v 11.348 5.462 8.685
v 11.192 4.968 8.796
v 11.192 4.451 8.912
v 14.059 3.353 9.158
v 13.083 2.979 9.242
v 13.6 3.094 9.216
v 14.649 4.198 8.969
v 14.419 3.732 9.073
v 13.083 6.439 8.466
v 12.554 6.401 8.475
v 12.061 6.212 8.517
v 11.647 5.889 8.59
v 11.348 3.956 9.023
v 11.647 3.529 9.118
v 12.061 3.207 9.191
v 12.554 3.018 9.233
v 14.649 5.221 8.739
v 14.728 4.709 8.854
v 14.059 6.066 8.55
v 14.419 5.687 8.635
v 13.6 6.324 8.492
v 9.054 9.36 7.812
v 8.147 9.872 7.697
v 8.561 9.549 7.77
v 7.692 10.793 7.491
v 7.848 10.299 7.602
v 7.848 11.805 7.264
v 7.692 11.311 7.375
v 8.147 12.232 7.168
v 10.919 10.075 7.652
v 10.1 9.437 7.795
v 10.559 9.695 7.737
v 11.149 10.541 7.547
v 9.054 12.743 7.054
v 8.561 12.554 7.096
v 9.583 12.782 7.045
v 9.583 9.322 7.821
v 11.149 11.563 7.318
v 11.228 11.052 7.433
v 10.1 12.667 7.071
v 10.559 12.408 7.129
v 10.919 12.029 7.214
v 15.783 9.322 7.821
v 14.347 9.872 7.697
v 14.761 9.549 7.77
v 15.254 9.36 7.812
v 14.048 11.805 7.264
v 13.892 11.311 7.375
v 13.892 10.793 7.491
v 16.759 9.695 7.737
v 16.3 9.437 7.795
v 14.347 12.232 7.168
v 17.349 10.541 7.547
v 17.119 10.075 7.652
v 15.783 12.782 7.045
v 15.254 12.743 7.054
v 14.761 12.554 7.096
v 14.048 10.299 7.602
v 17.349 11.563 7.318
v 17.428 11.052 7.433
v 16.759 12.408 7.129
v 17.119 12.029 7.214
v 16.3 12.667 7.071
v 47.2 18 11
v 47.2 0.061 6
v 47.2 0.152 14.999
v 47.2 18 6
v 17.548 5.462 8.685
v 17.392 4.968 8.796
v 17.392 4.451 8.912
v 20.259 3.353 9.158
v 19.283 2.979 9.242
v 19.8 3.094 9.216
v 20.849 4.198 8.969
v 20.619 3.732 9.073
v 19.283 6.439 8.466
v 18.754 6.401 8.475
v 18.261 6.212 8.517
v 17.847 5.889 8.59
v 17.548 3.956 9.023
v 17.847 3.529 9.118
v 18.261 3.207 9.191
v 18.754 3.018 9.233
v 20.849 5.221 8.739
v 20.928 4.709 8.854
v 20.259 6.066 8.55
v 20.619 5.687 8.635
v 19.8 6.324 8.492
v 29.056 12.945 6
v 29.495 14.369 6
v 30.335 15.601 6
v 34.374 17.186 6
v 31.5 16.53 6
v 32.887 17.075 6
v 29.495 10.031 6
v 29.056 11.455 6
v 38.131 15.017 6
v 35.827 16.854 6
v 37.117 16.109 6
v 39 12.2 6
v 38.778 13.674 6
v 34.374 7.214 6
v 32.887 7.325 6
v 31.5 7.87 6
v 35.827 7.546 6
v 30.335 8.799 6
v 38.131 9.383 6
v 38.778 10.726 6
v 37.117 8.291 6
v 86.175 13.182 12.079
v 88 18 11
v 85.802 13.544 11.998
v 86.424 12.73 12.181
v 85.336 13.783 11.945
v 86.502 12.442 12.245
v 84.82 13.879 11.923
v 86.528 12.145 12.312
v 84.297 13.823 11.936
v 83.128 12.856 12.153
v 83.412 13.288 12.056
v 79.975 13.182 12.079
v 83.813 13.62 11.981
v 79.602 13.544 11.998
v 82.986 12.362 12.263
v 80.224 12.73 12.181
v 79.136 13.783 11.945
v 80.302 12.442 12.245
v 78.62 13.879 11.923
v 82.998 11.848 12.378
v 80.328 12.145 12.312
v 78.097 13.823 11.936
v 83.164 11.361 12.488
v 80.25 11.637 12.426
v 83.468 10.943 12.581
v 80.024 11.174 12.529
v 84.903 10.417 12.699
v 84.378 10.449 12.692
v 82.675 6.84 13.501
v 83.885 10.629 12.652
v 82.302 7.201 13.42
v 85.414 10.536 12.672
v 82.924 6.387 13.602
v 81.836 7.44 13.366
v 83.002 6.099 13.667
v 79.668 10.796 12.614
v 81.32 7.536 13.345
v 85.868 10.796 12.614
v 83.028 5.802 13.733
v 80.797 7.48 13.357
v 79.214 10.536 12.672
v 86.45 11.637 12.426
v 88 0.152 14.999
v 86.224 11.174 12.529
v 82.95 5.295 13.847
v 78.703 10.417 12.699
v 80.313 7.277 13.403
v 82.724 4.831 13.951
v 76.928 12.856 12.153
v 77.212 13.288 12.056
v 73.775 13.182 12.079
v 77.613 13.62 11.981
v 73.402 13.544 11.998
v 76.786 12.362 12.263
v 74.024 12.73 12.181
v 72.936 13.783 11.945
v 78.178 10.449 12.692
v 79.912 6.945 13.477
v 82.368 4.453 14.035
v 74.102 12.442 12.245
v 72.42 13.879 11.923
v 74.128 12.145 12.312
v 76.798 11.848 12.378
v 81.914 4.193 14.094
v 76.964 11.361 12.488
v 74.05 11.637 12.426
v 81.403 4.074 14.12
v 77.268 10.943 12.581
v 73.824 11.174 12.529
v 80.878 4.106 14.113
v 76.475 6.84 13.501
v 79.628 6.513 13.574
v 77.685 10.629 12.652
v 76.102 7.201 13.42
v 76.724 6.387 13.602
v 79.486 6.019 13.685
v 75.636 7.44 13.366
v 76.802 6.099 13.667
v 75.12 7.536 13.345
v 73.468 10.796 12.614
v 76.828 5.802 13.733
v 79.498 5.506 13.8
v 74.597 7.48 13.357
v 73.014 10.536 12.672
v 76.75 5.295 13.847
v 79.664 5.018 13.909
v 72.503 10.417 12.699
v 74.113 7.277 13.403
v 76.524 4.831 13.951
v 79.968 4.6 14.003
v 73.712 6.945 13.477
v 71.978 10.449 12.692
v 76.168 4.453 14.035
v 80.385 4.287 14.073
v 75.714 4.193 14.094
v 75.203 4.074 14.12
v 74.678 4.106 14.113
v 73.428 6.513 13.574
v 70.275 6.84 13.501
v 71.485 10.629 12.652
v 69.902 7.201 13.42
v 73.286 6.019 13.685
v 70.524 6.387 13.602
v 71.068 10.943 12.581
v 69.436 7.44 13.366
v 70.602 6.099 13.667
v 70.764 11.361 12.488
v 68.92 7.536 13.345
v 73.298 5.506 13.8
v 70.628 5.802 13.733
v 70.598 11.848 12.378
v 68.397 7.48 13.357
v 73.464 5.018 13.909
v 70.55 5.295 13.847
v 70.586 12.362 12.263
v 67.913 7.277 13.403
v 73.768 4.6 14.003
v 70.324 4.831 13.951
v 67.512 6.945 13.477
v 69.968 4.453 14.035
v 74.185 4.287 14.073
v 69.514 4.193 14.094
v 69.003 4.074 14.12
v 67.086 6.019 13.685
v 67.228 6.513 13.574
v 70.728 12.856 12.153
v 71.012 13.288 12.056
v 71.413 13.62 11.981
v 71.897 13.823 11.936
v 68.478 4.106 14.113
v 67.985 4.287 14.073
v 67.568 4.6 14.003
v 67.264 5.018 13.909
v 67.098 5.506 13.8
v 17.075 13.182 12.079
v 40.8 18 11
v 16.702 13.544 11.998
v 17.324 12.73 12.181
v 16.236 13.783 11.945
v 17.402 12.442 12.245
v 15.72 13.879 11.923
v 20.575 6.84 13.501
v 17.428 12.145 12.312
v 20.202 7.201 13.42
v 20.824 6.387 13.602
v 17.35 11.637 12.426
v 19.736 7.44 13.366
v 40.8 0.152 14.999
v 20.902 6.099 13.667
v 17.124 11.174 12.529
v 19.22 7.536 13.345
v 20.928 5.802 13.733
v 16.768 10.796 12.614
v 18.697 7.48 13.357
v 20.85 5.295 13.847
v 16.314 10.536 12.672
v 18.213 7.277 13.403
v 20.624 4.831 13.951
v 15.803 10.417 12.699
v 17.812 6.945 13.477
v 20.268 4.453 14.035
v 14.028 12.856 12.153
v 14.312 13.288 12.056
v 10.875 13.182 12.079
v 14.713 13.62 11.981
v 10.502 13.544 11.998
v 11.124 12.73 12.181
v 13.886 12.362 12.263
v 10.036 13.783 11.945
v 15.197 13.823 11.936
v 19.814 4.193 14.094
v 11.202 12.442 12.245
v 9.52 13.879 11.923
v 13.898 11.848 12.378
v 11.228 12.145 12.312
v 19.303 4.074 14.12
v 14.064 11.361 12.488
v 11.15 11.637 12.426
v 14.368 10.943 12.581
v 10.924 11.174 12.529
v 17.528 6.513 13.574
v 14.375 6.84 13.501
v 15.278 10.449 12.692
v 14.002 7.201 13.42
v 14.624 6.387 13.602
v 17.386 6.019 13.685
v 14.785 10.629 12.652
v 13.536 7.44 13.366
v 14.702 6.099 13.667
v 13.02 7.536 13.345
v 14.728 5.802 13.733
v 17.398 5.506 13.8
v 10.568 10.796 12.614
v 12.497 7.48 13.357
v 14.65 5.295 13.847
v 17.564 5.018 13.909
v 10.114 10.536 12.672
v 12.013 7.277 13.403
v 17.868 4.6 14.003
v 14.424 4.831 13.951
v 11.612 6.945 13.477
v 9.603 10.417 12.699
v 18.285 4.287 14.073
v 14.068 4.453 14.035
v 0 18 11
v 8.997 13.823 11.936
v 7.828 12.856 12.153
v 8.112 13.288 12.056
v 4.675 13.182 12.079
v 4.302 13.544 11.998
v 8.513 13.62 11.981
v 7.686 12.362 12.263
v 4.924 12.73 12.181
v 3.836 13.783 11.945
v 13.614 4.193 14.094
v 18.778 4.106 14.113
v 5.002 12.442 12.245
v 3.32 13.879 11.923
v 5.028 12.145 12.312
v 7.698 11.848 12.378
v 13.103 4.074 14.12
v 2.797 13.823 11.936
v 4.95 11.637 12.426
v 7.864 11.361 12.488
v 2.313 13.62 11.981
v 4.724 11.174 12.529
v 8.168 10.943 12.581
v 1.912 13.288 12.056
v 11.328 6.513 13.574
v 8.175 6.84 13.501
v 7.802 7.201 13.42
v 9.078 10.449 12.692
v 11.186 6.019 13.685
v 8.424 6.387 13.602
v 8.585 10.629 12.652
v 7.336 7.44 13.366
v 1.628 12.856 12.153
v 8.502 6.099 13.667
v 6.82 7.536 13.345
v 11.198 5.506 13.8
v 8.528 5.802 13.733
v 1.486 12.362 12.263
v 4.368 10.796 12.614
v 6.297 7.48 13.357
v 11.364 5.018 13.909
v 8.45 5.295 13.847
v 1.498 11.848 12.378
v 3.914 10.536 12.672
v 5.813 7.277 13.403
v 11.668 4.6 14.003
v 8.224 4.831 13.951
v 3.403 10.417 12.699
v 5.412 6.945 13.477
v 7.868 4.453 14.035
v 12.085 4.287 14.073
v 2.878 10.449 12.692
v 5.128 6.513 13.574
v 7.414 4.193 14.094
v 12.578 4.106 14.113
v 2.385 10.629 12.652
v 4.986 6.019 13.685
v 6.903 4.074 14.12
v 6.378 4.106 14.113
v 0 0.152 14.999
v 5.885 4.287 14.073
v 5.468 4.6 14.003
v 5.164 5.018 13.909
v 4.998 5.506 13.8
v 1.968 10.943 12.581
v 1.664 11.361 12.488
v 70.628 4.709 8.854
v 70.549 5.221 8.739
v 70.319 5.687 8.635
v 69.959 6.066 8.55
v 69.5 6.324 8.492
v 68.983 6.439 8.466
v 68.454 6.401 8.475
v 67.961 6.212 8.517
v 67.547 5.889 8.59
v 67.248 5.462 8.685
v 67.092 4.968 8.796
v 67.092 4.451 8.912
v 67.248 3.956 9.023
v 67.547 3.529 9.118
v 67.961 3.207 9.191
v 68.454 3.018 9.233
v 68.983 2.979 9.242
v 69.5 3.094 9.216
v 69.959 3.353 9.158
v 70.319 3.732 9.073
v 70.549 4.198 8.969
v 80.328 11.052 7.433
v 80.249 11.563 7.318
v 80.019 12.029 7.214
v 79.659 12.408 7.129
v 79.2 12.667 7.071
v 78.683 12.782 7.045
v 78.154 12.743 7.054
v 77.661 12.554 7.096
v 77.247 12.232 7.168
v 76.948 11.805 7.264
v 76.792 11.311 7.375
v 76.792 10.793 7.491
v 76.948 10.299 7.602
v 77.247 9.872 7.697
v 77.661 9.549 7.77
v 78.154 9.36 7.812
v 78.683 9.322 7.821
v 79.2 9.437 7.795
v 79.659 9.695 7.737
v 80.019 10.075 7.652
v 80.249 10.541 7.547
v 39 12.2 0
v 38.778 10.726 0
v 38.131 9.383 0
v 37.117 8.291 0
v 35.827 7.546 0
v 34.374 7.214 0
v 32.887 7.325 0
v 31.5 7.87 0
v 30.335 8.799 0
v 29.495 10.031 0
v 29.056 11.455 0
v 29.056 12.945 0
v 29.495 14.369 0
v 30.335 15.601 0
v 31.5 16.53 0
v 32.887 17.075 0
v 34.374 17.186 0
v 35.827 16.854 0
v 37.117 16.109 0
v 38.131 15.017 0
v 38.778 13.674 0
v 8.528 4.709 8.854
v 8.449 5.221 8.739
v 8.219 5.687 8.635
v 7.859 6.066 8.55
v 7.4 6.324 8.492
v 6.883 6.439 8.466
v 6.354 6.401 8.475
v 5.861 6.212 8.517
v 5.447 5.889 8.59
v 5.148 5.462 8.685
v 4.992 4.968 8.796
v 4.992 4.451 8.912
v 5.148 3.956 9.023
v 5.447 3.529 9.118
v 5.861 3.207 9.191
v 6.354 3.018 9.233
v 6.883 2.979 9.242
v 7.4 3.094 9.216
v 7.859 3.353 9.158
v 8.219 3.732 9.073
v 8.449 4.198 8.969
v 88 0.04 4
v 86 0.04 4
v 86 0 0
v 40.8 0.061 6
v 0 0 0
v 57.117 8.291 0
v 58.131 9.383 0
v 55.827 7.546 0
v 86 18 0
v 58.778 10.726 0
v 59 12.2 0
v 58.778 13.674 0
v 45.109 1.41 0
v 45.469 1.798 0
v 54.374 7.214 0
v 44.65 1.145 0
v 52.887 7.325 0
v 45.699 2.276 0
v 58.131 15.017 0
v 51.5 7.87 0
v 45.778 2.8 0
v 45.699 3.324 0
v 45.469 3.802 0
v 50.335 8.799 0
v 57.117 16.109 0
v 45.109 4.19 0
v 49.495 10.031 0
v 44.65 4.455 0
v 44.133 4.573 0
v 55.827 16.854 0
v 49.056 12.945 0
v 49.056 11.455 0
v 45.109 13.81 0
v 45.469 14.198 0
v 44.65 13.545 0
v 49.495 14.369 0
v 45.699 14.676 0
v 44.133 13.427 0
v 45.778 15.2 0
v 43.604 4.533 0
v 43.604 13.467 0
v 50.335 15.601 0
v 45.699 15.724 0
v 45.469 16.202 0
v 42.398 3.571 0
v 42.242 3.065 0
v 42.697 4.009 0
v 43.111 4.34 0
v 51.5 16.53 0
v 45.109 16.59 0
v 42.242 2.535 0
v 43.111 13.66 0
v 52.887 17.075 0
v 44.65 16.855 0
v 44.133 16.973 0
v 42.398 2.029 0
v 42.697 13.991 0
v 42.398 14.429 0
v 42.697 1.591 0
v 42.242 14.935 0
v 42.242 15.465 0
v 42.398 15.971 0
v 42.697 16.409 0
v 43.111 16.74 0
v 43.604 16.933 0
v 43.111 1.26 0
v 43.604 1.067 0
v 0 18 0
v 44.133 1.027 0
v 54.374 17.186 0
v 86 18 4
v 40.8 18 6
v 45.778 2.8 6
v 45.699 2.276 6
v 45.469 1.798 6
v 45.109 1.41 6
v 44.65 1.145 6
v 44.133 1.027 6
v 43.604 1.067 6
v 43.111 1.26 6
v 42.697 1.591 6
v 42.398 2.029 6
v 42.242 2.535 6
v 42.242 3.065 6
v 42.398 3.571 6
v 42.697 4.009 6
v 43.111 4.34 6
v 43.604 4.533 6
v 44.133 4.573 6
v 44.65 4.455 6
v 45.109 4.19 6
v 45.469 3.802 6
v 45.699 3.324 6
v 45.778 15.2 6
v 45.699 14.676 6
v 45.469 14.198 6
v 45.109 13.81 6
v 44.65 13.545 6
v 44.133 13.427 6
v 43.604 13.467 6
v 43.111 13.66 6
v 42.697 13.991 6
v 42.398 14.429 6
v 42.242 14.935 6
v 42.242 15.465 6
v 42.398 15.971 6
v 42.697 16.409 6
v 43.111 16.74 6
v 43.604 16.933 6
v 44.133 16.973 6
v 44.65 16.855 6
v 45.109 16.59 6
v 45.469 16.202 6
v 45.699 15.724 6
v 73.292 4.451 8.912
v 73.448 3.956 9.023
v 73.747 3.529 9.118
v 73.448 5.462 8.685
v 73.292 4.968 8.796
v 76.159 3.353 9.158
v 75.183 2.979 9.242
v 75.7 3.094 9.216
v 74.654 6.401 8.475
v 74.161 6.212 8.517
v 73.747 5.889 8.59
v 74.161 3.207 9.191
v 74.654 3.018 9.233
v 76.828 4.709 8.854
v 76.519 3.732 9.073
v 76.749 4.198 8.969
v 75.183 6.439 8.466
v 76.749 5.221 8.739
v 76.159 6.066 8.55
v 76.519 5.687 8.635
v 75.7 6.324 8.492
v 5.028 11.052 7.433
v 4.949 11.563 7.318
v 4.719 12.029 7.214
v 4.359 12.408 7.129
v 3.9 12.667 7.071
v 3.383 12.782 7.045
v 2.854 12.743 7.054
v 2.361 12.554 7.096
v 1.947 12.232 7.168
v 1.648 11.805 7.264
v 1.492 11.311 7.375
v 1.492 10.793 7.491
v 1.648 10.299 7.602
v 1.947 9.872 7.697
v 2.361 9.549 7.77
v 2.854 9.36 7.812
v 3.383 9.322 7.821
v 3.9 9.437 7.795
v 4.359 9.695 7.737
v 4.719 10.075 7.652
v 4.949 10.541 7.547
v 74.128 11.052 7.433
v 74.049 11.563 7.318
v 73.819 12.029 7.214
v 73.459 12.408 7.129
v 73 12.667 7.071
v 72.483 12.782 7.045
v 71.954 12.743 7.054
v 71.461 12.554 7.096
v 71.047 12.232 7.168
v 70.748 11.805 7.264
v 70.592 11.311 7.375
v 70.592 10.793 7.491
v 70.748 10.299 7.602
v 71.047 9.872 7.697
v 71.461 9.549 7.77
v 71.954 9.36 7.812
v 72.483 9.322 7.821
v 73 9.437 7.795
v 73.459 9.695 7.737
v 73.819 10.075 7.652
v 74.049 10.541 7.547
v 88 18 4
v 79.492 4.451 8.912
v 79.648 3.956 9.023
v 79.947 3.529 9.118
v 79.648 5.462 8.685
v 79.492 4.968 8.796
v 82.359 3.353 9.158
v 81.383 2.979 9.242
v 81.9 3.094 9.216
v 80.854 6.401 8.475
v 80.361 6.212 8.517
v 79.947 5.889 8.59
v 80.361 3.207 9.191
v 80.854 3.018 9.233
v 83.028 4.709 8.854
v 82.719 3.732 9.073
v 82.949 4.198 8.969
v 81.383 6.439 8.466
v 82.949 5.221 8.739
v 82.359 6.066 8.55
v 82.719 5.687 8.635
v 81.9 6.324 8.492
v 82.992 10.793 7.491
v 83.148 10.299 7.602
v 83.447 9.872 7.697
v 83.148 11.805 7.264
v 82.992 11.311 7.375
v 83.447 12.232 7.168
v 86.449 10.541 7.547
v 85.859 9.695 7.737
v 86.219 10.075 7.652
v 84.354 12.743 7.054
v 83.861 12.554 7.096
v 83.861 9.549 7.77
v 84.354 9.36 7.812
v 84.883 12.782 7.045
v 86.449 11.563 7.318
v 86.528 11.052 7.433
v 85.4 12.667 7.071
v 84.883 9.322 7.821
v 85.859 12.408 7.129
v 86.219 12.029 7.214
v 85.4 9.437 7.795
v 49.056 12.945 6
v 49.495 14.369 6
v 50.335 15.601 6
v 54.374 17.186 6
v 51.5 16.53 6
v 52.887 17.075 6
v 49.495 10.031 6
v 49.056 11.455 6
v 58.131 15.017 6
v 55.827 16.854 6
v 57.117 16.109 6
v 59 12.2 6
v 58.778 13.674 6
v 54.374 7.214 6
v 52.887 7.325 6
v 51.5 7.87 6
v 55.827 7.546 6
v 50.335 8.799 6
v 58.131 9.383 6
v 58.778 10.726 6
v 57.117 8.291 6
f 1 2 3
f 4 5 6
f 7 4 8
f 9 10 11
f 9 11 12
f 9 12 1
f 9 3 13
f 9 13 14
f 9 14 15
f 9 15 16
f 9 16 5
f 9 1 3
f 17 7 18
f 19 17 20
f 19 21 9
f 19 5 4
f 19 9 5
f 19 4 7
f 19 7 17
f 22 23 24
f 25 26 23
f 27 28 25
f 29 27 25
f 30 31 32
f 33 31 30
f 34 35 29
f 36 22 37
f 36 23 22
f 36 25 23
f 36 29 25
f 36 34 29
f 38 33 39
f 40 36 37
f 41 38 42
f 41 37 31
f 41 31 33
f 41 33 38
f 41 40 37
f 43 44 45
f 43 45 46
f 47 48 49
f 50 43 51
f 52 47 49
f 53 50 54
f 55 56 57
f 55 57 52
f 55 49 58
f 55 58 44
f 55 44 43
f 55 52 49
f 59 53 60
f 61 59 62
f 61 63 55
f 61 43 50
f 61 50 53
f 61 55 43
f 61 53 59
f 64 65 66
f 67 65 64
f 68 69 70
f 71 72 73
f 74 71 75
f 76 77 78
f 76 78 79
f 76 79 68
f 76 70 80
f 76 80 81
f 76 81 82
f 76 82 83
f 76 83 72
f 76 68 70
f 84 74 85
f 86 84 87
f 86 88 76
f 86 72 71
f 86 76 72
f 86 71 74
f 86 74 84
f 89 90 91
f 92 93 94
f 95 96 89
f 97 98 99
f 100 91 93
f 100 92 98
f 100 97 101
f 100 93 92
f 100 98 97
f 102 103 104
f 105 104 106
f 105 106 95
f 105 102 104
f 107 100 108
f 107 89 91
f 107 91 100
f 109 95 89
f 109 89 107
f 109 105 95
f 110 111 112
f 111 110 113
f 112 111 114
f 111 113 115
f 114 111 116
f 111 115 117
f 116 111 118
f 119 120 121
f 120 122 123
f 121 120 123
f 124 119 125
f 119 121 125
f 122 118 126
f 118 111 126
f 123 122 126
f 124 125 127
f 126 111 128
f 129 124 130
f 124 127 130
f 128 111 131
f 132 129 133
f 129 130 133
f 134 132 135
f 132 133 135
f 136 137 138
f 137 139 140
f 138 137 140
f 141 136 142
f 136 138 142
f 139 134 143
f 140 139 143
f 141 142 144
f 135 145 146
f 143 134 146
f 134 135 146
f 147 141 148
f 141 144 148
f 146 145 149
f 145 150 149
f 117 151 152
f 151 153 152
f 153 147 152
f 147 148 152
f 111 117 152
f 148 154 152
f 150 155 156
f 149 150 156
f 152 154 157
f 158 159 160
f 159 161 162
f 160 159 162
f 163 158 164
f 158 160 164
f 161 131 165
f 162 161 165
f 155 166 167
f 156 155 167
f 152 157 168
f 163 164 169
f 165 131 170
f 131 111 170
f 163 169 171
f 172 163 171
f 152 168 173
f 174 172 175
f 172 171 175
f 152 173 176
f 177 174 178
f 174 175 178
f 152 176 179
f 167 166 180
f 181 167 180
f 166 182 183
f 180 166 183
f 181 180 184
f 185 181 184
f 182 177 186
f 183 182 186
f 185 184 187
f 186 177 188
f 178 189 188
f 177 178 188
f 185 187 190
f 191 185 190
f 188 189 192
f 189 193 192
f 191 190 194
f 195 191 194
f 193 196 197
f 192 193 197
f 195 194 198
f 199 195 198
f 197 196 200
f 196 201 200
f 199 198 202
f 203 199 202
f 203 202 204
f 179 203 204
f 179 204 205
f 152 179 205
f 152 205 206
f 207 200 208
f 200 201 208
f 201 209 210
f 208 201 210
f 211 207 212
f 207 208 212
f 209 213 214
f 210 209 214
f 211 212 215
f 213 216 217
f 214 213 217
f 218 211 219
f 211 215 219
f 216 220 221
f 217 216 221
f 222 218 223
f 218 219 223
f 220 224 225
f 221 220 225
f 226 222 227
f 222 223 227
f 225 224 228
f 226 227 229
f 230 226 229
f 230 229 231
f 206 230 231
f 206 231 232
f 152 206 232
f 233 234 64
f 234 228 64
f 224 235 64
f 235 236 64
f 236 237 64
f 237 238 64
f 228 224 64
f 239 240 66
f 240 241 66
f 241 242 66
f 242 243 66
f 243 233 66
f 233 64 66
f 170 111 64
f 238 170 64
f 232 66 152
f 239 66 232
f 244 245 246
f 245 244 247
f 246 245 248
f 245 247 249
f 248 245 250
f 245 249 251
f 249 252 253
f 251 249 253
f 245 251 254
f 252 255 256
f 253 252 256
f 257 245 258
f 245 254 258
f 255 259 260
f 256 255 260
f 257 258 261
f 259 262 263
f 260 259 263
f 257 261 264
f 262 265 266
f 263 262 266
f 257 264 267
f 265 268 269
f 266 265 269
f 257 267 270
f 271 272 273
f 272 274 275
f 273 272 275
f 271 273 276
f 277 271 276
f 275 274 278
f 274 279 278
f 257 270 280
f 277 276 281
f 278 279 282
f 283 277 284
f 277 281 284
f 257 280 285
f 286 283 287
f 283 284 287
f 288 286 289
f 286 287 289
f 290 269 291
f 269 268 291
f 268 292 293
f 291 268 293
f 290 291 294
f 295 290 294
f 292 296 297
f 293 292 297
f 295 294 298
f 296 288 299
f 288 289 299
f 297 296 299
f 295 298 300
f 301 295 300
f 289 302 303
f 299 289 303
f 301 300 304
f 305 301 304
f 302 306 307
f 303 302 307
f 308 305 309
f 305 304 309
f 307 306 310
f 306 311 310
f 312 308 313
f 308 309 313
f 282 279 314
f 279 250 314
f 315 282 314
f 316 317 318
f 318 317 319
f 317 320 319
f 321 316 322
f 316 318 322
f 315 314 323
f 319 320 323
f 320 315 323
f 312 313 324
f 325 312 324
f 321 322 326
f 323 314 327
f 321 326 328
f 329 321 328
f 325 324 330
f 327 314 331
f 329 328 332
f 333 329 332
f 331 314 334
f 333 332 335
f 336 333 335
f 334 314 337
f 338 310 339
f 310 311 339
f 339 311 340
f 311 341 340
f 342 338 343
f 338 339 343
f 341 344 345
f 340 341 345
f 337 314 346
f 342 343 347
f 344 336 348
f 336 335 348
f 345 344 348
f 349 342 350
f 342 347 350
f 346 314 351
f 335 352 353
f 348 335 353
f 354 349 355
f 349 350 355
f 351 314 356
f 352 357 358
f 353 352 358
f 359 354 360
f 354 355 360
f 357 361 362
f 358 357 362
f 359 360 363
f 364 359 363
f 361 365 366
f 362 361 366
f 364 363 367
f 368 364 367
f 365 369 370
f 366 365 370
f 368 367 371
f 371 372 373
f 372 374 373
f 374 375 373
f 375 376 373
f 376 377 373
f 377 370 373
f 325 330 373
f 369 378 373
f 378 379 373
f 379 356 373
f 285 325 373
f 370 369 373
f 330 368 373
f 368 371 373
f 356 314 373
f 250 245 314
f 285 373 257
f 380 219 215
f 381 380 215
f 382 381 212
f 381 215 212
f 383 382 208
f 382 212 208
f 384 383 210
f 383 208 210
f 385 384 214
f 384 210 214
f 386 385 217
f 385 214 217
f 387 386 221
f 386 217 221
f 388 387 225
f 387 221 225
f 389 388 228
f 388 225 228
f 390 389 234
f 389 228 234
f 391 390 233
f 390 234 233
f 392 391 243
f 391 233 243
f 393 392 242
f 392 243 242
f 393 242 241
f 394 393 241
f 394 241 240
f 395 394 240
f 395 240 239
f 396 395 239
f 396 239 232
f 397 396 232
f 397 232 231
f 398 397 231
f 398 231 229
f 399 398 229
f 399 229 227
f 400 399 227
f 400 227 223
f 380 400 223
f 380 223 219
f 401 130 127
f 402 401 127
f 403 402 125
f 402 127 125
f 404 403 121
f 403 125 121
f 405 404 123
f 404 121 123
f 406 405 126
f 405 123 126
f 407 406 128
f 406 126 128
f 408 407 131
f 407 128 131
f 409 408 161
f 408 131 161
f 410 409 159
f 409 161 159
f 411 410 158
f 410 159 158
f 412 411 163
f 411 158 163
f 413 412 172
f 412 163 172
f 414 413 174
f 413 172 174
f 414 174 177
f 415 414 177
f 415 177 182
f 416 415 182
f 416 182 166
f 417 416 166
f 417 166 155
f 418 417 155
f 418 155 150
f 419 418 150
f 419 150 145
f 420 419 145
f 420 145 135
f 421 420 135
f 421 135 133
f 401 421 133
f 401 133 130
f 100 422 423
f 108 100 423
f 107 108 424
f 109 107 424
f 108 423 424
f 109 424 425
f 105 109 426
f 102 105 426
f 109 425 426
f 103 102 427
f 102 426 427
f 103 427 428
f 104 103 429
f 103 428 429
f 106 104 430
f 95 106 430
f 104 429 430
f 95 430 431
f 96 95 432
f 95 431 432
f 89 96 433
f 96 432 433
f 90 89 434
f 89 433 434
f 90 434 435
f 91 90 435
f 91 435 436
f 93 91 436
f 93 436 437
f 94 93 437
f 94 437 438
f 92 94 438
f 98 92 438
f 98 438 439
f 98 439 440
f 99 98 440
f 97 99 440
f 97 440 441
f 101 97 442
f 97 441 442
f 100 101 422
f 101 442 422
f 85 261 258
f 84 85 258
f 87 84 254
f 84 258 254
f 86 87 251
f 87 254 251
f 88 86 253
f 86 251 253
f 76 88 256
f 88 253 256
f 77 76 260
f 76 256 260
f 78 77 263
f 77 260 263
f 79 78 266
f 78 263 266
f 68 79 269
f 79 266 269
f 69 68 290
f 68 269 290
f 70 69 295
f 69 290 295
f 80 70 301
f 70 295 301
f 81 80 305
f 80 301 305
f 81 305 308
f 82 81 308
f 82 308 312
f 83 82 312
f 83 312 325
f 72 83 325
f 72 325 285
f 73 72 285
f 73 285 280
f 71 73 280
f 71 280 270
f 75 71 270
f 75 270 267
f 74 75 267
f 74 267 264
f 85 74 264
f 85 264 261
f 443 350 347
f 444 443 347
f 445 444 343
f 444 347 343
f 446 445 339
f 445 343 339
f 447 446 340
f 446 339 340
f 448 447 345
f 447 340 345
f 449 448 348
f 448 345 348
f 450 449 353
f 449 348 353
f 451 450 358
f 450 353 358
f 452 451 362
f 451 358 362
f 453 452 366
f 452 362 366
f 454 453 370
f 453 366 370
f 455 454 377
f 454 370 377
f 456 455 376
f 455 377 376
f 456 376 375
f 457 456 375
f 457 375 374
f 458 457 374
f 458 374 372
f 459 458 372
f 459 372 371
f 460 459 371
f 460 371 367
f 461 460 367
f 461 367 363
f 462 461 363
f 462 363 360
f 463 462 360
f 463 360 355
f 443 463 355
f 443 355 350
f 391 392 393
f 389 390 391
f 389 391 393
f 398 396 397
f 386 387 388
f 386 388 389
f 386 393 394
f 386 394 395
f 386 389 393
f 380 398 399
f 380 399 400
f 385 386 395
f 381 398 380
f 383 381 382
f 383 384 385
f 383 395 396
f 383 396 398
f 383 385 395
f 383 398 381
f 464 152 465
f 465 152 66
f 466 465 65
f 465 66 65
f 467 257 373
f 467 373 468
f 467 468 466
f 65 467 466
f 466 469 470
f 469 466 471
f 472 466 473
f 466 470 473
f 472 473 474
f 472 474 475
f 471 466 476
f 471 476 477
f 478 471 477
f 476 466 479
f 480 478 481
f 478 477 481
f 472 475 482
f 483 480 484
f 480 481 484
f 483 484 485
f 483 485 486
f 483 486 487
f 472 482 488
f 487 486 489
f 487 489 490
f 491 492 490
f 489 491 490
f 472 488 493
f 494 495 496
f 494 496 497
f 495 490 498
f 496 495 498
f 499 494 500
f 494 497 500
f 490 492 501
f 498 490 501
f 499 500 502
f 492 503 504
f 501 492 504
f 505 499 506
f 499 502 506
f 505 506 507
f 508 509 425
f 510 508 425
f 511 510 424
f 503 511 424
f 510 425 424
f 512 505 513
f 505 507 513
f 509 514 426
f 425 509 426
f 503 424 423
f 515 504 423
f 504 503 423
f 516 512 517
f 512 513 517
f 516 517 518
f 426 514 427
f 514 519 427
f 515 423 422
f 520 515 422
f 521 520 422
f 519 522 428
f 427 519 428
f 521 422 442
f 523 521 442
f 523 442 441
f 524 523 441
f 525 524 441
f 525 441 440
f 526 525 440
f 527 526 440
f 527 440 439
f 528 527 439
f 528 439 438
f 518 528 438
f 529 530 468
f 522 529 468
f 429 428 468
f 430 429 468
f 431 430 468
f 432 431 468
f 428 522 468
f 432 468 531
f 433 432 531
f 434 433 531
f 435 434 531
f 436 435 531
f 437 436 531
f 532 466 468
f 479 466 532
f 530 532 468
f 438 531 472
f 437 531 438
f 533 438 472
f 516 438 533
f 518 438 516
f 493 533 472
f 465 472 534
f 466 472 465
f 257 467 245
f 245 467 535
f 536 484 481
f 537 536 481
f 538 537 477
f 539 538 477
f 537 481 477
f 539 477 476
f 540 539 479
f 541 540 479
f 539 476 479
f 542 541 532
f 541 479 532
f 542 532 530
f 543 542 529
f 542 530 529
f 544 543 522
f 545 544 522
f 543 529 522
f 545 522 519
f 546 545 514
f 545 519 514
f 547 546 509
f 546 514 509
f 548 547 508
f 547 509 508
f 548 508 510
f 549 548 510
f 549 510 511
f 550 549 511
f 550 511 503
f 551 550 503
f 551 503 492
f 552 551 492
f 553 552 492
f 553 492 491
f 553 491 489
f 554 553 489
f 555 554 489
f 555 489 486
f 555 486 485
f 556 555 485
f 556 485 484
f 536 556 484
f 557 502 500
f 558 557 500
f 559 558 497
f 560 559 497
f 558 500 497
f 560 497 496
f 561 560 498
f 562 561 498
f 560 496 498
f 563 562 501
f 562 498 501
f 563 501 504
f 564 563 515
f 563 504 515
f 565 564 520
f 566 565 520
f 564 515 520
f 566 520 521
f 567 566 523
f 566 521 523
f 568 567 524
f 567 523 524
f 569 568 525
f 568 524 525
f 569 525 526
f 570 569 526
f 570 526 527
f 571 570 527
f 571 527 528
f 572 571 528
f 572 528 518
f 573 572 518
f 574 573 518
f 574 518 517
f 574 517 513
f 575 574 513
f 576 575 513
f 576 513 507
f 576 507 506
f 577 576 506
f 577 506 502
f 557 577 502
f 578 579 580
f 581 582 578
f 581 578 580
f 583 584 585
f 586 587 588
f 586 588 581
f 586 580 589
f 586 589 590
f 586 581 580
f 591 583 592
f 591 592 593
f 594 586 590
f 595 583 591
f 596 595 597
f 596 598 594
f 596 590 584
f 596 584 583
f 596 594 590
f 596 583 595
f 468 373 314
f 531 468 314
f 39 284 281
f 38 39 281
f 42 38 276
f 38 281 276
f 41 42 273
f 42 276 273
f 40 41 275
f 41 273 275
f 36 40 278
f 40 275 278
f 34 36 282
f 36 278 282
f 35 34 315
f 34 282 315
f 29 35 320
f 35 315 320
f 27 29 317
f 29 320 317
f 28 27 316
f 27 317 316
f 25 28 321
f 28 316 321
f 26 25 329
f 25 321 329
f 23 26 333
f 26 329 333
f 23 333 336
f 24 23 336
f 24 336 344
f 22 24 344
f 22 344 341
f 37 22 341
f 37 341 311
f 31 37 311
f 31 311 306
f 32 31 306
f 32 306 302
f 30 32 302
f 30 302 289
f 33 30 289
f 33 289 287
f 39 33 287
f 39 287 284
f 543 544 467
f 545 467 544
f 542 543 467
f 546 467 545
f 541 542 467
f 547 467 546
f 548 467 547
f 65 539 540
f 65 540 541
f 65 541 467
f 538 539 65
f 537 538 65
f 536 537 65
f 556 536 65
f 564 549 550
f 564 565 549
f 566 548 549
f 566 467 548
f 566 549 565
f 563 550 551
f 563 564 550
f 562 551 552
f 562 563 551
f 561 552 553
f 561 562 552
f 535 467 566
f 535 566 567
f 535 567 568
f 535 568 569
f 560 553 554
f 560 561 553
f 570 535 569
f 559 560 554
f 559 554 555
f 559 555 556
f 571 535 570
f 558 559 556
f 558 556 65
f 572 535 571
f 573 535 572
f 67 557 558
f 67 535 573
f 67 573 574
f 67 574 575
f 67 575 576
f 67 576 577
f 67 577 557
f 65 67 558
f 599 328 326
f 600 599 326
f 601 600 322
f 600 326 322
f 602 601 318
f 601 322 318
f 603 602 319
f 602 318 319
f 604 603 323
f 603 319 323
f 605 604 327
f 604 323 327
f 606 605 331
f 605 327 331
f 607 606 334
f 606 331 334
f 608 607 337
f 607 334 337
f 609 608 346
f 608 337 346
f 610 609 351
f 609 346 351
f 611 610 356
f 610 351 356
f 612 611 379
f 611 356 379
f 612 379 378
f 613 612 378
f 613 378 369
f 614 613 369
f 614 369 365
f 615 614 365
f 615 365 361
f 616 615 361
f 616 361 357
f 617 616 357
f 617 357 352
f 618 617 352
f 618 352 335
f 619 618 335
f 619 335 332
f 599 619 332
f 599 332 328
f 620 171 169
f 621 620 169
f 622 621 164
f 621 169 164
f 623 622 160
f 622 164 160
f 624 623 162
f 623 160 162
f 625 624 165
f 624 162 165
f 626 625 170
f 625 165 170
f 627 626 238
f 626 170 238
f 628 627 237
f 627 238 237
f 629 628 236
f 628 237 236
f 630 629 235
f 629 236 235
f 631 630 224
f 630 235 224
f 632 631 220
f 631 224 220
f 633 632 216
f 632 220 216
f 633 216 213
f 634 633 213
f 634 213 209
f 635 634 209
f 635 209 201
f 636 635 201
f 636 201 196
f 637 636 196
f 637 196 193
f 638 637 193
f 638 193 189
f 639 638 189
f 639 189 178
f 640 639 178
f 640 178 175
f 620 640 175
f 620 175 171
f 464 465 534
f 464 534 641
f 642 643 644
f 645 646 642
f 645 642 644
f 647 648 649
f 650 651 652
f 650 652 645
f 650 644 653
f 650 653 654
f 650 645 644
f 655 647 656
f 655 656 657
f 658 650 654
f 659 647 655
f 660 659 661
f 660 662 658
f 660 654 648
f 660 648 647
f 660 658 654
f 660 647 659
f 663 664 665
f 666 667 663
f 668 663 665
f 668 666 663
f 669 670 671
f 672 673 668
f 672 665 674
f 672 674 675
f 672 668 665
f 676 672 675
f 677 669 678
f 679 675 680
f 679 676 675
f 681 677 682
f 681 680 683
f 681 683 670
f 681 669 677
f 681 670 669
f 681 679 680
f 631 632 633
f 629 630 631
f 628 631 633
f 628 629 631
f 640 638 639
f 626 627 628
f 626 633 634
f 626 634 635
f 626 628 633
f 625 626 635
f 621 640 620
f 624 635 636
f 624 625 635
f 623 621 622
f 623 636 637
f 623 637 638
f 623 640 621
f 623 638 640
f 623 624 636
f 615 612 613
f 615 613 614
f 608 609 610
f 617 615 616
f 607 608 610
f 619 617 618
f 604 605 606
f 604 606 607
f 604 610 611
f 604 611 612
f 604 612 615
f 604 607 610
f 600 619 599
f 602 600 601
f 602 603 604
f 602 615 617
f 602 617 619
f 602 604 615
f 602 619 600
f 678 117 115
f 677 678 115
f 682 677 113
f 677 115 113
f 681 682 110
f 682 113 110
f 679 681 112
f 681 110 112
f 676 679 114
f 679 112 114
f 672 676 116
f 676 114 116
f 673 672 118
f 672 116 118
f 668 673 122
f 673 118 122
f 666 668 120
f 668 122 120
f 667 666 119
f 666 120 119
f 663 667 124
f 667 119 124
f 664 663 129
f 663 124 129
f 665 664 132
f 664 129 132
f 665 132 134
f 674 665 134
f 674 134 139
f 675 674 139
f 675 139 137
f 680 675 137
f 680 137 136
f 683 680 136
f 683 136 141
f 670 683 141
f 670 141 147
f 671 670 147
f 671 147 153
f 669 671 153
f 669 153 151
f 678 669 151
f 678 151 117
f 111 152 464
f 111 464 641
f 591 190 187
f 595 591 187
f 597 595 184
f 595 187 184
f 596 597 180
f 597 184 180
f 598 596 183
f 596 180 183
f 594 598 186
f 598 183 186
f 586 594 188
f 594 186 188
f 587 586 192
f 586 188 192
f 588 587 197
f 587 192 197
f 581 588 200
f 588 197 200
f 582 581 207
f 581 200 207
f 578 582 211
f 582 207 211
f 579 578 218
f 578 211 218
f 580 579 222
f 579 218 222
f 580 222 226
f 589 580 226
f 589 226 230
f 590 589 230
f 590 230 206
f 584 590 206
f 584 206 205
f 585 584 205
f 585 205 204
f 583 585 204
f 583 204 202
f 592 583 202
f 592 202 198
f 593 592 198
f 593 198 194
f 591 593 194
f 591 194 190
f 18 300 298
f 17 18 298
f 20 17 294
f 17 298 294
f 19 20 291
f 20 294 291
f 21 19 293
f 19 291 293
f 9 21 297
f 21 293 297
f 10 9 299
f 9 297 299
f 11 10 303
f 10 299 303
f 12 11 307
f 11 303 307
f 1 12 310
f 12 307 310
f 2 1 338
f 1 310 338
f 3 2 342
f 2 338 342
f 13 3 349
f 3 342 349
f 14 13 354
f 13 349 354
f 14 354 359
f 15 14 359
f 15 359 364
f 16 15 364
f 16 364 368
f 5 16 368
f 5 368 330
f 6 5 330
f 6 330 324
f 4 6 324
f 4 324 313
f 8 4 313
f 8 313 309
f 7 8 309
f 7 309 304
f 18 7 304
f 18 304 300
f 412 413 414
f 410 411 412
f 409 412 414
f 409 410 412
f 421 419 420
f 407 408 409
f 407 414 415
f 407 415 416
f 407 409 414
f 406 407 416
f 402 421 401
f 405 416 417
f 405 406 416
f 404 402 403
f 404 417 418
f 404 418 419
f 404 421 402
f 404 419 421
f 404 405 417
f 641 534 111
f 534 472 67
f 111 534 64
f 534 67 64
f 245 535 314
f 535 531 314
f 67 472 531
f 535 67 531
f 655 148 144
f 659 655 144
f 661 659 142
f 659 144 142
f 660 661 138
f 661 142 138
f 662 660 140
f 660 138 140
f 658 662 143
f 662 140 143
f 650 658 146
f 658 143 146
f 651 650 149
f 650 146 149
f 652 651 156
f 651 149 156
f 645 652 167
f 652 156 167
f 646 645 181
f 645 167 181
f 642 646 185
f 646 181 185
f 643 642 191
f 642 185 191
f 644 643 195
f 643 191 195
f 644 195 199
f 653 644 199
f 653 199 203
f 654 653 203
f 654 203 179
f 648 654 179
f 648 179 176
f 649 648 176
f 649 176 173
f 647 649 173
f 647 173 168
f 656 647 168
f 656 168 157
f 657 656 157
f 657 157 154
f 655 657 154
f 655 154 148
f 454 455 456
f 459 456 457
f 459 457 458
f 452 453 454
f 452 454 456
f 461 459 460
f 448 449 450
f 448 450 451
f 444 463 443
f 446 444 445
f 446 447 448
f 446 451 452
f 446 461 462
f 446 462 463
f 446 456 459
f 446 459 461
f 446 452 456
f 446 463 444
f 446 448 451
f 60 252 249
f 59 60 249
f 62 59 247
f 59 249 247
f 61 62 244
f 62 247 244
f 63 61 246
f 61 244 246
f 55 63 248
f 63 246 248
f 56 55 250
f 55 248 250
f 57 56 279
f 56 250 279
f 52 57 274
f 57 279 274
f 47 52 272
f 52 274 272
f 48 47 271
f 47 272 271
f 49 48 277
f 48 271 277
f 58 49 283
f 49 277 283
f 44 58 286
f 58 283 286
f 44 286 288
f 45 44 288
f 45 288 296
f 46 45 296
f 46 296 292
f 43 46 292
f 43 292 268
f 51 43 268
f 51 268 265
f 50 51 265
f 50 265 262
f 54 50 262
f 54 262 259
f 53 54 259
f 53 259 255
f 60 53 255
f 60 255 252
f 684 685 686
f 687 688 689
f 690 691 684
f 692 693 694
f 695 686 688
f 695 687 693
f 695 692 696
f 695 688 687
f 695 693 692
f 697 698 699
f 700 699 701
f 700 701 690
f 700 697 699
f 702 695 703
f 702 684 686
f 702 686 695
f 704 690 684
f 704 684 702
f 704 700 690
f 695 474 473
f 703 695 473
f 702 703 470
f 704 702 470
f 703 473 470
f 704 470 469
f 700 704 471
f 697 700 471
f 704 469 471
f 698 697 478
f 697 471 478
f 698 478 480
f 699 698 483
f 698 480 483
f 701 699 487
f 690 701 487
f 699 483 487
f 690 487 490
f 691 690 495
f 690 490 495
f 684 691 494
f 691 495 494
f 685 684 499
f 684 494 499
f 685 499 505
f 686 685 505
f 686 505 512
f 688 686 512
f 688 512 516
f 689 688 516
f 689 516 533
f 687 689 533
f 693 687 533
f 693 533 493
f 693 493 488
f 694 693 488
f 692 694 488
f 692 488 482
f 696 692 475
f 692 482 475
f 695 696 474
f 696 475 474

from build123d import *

# Parameters (mm, degrees)
F1_DEPTH  = 88
F2_R      = 1.778
F3_DEPTH  = 5
F4_R      = 1.778
F5_DEPTH  = 11.627384
F7_W      = 6.4
F7_H      = 21.920782
F8_DEPTH  = 25
F9_R      = 5
F10_DEPTH = 6
F11_W     = 2
F11_H     = 18
F12_DEPTH = 4


with BuildPart() as f1:
    # F0 (on Right) → F1 (new body)
    with BuildSketch(Plane.YZ):
        Polygon((0.151508, 14.999235), (0, 0), (18, 0), (18, 11), align=None)
    extrude(amount=F1_DEPTH)

    # F2 (on face) → F3 (cut)
    with BuildSketch(Plane(origin=(0, 3.207392, 14.314516), x_dir=(1, 0, 0), z_dir=(0, 0.218644, 0.975805))):
        with Locations((19.15, 2.659395)):
            Circle(F2_R)
        with Locations((12.95, 2.659395)):
            Circle(F2_R)
        with Locations((6.75, 2.659395)):
            Circle(F2_R)
        with Locations((15.65, 9.159395)):
            Circle(F2_R)
        with Locations((3.25, 9.159395)):
            Circle(F2_R)
        with Locations((75.05, 2.659395)):
            Circle(F2_R)
        with Locations((68.85, 2.659395)):
            Circle(F2_R)
        with Locations((81.25, 2.659395)):
            Circle(F2_R)
        with Locations((72.35, 9.159395)):
            Circle(F2_R)
        with Locations((78.55, 9.159395)):
            Circle(F2_R)
        with Locations((84.75, 9.159395)):
            Circle(F2_R)
        with Locations((9.45, 9.159395)):
            Circle(F2_R)
    extrude(amount=-F3_DEPTH, mode=Mode.SUBTRACT)

    # F4 (on face) → F5 (cut, through all)
    with BuildSketch(Plane(origin=(0, 0, 0), x_dir=(1, 0, 0), z_dir=(0, 0, -1))):
        with Locations((44, -15.2)):
            Circle(F4_R)
        with Locations((44, -2.8)):
            Circle(F4_R)
    extrude(amount=-F5_DEPTH, mode=Mode.SUBTRACT)

    # F7 (on offset) → F8 (cut)
    with BuildSketch(Plane.XY.offset(6)):
        with Locations((44, 7.695412)):
            Rectangle(F7_W, F7_H)
    extrude(amount=F8_DEPTH, mode=Mode.SUBTRACT)

    # F9 (on face) → F10 (cut)
    with BuildSketch(Plane(origin=(0, 0, 0), x_dir=(1, 0, 0), z_dir=(0, 0, -1))):
        with Locations((54, -12.2)):
            Circle(F9_R)
        with Locations((34, -12.2)):
            Circle(F9_R)
    extrude(amount=-F10_DEPTH, mode=Mode.SUBTRACT)

    # F11 (on face) → F12 (cut)
    with BuildSketch(Plane(origin=(0, 0, 0), x_dir=(1, 0, 0), z_dir=(0, 0, -1))):
        with Locations((87, -9)):
            Rectangle(F11_W, F11_H)
    extrude(amount=-F12_DEPTH, mode=Mode.SUBTRACT)


solid = f1.part
